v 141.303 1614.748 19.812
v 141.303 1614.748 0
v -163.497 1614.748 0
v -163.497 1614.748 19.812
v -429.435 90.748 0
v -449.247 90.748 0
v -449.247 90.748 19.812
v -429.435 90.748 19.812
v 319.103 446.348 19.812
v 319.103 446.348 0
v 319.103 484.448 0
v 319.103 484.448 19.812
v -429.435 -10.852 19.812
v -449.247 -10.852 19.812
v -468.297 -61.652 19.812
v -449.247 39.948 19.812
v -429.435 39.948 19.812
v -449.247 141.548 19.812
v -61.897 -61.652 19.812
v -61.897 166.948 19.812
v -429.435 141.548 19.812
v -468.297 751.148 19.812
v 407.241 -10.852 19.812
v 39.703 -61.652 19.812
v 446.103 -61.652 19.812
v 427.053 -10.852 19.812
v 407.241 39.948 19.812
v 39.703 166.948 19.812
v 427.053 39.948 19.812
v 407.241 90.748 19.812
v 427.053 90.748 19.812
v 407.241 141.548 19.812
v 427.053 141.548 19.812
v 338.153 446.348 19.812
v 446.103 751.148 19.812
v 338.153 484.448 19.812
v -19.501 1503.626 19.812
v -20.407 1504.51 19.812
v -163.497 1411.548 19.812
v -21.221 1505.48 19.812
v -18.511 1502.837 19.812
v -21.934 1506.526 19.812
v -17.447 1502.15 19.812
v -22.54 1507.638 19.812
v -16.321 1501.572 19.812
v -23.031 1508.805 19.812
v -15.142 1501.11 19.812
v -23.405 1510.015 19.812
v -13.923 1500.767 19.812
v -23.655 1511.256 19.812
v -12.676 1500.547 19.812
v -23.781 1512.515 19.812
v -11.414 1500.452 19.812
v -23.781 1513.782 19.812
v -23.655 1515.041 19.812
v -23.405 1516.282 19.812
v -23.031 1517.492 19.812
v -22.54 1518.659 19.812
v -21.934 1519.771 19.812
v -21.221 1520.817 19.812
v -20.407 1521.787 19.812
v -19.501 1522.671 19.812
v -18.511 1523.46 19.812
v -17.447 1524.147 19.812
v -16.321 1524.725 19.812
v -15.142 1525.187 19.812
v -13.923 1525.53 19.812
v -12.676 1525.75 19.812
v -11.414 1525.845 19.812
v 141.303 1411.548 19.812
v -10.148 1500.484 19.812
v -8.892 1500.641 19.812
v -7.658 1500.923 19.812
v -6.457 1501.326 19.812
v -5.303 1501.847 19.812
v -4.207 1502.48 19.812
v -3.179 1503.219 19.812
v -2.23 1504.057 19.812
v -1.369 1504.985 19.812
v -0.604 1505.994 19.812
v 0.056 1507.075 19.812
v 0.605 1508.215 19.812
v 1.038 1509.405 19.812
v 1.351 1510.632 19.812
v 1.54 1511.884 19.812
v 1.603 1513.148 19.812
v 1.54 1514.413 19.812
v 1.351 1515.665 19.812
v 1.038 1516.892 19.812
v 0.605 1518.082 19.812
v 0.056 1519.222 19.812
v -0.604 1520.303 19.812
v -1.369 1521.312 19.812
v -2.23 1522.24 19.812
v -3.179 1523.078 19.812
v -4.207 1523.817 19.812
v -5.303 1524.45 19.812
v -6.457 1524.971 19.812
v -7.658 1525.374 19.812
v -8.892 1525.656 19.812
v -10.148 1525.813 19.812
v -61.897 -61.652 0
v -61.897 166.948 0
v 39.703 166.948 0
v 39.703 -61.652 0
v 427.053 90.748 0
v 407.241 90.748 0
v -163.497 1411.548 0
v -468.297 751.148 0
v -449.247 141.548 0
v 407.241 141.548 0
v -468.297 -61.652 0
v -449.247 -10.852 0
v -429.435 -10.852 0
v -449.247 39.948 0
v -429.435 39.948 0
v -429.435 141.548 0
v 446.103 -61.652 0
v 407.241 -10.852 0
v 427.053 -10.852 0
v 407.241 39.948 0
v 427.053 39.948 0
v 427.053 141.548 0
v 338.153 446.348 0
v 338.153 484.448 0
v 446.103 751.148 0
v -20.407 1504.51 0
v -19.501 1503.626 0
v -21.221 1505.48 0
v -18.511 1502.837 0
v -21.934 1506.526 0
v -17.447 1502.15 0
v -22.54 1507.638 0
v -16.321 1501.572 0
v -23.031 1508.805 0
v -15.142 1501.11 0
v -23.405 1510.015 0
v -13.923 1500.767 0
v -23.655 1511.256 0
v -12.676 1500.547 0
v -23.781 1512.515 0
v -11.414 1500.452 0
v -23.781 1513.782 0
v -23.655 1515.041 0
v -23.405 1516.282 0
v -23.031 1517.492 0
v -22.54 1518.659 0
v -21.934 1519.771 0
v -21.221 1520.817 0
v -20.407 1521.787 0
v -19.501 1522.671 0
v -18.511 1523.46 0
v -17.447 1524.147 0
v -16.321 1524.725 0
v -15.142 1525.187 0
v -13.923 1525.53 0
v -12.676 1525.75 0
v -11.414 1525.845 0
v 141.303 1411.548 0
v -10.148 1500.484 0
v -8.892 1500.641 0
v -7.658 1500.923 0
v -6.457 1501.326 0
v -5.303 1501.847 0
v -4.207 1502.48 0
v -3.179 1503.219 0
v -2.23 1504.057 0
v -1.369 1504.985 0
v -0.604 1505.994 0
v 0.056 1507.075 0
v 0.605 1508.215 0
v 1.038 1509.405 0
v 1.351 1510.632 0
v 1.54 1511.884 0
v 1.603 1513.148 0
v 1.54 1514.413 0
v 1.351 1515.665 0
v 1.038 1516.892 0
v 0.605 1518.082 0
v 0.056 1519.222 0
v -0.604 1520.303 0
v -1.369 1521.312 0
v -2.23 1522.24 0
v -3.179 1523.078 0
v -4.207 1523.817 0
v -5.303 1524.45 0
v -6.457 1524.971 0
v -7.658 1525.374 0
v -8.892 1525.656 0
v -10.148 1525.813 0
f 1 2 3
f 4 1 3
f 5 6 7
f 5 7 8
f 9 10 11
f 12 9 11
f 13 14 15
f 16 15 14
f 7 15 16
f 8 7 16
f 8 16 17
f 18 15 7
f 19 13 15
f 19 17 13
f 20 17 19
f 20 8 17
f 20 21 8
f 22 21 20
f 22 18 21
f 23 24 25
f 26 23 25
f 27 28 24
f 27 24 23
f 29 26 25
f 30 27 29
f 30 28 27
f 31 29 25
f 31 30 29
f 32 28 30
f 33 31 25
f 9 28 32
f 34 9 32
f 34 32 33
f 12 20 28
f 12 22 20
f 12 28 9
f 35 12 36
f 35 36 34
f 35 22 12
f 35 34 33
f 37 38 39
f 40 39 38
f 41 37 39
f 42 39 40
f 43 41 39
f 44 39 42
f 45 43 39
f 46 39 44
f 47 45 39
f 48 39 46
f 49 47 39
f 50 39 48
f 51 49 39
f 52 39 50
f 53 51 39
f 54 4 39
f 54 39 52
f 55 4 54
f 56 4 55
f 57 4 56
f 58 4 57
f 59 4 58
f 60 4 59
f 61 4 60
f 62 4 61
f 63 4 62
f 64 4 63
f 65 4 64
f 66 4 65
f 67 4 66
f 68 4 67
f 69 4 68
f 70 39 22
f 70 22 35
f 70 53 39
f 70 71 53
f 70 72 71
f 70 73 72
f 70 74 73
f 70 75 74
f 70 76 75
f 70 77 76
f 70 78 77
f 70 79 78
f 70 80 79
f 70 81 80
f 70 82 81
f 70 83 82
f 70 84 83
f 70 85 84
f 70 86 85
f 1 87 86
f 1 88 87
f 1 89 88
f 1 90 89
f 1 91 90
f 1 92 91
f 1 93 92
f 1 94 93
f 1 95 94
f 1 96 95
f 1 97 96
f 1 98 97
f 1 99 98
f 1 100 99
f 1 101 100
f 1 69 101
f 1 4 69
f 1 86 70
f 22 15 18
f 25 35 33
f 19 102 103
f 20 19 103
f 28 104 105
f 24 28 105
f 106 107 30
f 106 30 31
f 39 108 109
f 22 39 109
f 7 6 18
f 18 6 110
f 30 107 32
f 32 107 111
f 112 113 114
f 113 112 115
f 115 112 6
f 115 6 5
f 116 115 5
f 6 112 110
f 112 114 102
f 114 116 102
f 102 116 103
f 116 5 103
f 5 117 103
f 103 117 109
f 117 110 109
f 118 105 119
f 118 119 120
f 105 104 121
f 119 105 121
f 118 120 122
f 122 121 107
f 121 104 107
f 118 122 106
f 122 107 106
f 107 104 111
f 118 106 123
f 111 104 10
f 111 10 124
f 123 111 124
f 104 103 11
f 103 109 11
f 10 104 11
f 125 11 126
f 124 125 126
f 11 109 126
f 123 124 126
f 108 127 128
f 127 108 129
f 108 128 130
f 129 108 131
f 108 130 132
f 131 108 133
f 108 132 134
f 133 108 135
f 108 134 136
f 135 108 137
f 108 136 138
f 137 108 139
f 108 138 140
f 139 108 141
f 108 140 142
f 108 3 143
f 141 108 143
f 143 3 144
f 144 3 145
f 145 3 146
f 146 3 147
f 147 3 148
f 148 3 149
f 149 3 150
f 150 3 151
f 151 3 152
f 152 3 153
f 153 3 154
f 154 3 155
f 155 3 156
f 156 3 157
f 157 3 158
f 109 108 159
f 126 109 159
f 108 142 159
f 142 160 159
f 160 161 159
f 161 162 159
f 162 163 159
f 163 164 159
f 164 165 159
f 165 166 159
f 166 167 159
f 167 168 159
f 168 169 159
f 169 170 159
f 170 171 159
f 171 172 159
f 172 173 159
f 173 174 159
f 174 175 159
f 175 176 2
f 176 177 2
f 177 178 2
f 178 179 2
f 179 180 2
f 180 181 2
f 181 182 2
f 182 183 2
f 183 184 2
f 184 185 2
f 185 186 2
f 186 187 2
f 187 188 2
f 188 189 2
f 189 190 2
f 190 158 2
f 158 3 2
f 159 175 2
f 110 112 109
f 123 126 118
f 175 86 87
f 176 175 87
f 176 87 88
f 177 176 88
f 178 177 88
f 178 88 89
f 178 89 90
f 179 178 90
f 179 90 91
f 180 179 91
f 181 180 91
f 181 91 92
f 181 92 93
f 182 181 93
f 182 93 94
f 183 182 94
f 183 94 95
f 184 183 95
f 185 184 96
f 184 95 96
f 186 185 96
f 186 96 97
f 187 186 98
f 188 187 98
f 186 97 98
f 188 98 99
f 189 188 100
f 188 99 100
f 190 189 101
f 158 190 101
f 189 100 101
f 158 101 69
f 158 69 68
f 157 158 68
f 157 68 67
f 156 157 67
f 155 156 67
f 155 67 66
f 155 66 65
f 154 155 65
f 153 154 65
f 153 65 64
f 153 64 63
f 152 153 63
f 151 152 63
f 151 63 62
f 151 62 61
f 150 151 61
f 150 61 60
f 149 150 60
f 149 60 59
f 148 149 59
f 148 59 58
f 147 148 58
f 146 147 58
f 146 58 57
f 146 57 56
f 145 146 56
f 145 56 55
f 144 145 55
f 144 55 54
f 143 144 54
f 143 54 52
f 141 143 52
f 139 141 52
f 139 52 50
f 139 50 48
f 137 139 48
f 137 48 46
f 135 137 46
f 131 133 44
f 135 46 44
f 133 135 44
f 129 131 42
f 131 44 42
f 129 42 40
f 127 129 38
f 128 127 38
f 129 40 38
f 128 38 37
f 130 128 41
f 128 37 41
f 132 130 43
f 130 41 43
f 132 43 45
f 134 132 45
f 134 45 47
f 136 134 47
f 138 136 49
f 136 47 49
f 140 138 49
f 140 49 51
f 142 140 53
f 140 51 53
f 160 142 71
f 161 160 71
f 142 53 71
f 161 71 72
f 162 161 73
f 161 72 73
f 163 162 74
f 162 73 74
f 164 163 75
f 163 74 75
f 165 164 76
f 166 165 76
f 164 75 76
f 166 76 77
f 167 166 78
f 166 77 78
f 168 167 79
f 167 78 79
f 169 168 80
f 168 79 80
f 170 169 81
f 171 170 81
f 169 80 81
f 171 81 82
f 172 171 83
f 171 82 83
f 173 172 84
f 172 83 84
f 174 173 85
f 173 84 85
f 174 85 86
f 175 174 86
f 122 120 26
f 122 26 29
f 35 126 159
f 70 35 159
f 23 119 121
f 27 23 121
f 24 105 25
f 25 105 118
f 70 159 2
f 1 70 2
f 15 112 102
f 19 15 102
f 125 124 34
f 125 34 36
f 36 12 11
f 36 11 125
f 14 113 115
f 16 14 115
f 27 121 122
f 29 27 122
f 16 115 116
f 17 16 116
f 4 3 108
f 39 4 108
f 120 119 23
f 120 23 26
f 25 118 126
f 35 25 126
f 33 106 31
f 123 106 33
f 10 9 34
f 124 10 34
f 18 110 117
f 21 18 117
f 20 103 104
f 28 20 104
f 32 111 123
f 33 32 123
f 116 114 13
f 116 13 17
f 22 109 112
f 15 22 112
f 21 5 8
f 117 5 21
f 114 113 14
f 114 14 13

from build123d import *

# Parameters (mm, degrees)
F0_W     = 19.812
F0_H     = 50.8
F0_W_2   = 19.05
F0_H_2   = 38.1
F1_DEPTH = 19.812
F2_R     = 12.7
F3_DEPTH = 254


# Not quite as in the source:
# - a feature names something its author has since deleted; it is built from what else it names


with BuildPart() as f1:
    # F0 (on Top) → F1 (new body)
    with BuildSketch(Plane.XY):
        Polygon((-468.2972775146, 751.1484609425), (-468.2972775146, -61.6515390575), (-61.8972775146, -61.6515390575), (-61.8972775146, 166.9484609425), (39.7027224854, 166.9484609425), (39.7027224854, -61.6515390575), (446.1027224854, -61.6515390575), (446.1027224854, 751.1484609425), (141.3027224854, 1411.5484609425), (141.3027224854, 1614.7484609425), (-11.0972775146, 1614.7484609425), (-163.4972775146, 1614.7484609425), (-163.4972775146, 1411.5484609425), align=None)
        with Locations((-439.3412775146, 14.5484609425)):
            Rectangle(F0_W, F0_H, mode=Mode.SUBTRACT)
        with Locations((-439.3412775146, 116.1484609425)):
            Rectangle(F0_W, F0_H, mode=Mode.SUBTRACT)
        with Locations((417.1467224854, 14.5484609425)):
            Rectangle(F0_W, F0_H, mode=Mode.SUBTRACT)
        with Locations((417.1467224854, 116.1484609425)):
            Rectangle(F0_W, F0_H, mode=Mode.SUBTRACT)
        with Locations((328.6277224854, 465.3984609425)):
            Rectangle(F0_W_2, F0_H_2, mode=Mode.SUBTRACT)
    extrude(amount=F1_DEPTH)

    # F2 (on face) → F3 (cut)
    with BuildSketch(Plane.XY.offset(19.812)):
        with Locations((-11.0972775146, 1513.1484609425)):
            Circle(F2_R)
    extrude(amount=-F3_DEPTH, mode=Mode.SUBTRACT)


solid = f1.part
